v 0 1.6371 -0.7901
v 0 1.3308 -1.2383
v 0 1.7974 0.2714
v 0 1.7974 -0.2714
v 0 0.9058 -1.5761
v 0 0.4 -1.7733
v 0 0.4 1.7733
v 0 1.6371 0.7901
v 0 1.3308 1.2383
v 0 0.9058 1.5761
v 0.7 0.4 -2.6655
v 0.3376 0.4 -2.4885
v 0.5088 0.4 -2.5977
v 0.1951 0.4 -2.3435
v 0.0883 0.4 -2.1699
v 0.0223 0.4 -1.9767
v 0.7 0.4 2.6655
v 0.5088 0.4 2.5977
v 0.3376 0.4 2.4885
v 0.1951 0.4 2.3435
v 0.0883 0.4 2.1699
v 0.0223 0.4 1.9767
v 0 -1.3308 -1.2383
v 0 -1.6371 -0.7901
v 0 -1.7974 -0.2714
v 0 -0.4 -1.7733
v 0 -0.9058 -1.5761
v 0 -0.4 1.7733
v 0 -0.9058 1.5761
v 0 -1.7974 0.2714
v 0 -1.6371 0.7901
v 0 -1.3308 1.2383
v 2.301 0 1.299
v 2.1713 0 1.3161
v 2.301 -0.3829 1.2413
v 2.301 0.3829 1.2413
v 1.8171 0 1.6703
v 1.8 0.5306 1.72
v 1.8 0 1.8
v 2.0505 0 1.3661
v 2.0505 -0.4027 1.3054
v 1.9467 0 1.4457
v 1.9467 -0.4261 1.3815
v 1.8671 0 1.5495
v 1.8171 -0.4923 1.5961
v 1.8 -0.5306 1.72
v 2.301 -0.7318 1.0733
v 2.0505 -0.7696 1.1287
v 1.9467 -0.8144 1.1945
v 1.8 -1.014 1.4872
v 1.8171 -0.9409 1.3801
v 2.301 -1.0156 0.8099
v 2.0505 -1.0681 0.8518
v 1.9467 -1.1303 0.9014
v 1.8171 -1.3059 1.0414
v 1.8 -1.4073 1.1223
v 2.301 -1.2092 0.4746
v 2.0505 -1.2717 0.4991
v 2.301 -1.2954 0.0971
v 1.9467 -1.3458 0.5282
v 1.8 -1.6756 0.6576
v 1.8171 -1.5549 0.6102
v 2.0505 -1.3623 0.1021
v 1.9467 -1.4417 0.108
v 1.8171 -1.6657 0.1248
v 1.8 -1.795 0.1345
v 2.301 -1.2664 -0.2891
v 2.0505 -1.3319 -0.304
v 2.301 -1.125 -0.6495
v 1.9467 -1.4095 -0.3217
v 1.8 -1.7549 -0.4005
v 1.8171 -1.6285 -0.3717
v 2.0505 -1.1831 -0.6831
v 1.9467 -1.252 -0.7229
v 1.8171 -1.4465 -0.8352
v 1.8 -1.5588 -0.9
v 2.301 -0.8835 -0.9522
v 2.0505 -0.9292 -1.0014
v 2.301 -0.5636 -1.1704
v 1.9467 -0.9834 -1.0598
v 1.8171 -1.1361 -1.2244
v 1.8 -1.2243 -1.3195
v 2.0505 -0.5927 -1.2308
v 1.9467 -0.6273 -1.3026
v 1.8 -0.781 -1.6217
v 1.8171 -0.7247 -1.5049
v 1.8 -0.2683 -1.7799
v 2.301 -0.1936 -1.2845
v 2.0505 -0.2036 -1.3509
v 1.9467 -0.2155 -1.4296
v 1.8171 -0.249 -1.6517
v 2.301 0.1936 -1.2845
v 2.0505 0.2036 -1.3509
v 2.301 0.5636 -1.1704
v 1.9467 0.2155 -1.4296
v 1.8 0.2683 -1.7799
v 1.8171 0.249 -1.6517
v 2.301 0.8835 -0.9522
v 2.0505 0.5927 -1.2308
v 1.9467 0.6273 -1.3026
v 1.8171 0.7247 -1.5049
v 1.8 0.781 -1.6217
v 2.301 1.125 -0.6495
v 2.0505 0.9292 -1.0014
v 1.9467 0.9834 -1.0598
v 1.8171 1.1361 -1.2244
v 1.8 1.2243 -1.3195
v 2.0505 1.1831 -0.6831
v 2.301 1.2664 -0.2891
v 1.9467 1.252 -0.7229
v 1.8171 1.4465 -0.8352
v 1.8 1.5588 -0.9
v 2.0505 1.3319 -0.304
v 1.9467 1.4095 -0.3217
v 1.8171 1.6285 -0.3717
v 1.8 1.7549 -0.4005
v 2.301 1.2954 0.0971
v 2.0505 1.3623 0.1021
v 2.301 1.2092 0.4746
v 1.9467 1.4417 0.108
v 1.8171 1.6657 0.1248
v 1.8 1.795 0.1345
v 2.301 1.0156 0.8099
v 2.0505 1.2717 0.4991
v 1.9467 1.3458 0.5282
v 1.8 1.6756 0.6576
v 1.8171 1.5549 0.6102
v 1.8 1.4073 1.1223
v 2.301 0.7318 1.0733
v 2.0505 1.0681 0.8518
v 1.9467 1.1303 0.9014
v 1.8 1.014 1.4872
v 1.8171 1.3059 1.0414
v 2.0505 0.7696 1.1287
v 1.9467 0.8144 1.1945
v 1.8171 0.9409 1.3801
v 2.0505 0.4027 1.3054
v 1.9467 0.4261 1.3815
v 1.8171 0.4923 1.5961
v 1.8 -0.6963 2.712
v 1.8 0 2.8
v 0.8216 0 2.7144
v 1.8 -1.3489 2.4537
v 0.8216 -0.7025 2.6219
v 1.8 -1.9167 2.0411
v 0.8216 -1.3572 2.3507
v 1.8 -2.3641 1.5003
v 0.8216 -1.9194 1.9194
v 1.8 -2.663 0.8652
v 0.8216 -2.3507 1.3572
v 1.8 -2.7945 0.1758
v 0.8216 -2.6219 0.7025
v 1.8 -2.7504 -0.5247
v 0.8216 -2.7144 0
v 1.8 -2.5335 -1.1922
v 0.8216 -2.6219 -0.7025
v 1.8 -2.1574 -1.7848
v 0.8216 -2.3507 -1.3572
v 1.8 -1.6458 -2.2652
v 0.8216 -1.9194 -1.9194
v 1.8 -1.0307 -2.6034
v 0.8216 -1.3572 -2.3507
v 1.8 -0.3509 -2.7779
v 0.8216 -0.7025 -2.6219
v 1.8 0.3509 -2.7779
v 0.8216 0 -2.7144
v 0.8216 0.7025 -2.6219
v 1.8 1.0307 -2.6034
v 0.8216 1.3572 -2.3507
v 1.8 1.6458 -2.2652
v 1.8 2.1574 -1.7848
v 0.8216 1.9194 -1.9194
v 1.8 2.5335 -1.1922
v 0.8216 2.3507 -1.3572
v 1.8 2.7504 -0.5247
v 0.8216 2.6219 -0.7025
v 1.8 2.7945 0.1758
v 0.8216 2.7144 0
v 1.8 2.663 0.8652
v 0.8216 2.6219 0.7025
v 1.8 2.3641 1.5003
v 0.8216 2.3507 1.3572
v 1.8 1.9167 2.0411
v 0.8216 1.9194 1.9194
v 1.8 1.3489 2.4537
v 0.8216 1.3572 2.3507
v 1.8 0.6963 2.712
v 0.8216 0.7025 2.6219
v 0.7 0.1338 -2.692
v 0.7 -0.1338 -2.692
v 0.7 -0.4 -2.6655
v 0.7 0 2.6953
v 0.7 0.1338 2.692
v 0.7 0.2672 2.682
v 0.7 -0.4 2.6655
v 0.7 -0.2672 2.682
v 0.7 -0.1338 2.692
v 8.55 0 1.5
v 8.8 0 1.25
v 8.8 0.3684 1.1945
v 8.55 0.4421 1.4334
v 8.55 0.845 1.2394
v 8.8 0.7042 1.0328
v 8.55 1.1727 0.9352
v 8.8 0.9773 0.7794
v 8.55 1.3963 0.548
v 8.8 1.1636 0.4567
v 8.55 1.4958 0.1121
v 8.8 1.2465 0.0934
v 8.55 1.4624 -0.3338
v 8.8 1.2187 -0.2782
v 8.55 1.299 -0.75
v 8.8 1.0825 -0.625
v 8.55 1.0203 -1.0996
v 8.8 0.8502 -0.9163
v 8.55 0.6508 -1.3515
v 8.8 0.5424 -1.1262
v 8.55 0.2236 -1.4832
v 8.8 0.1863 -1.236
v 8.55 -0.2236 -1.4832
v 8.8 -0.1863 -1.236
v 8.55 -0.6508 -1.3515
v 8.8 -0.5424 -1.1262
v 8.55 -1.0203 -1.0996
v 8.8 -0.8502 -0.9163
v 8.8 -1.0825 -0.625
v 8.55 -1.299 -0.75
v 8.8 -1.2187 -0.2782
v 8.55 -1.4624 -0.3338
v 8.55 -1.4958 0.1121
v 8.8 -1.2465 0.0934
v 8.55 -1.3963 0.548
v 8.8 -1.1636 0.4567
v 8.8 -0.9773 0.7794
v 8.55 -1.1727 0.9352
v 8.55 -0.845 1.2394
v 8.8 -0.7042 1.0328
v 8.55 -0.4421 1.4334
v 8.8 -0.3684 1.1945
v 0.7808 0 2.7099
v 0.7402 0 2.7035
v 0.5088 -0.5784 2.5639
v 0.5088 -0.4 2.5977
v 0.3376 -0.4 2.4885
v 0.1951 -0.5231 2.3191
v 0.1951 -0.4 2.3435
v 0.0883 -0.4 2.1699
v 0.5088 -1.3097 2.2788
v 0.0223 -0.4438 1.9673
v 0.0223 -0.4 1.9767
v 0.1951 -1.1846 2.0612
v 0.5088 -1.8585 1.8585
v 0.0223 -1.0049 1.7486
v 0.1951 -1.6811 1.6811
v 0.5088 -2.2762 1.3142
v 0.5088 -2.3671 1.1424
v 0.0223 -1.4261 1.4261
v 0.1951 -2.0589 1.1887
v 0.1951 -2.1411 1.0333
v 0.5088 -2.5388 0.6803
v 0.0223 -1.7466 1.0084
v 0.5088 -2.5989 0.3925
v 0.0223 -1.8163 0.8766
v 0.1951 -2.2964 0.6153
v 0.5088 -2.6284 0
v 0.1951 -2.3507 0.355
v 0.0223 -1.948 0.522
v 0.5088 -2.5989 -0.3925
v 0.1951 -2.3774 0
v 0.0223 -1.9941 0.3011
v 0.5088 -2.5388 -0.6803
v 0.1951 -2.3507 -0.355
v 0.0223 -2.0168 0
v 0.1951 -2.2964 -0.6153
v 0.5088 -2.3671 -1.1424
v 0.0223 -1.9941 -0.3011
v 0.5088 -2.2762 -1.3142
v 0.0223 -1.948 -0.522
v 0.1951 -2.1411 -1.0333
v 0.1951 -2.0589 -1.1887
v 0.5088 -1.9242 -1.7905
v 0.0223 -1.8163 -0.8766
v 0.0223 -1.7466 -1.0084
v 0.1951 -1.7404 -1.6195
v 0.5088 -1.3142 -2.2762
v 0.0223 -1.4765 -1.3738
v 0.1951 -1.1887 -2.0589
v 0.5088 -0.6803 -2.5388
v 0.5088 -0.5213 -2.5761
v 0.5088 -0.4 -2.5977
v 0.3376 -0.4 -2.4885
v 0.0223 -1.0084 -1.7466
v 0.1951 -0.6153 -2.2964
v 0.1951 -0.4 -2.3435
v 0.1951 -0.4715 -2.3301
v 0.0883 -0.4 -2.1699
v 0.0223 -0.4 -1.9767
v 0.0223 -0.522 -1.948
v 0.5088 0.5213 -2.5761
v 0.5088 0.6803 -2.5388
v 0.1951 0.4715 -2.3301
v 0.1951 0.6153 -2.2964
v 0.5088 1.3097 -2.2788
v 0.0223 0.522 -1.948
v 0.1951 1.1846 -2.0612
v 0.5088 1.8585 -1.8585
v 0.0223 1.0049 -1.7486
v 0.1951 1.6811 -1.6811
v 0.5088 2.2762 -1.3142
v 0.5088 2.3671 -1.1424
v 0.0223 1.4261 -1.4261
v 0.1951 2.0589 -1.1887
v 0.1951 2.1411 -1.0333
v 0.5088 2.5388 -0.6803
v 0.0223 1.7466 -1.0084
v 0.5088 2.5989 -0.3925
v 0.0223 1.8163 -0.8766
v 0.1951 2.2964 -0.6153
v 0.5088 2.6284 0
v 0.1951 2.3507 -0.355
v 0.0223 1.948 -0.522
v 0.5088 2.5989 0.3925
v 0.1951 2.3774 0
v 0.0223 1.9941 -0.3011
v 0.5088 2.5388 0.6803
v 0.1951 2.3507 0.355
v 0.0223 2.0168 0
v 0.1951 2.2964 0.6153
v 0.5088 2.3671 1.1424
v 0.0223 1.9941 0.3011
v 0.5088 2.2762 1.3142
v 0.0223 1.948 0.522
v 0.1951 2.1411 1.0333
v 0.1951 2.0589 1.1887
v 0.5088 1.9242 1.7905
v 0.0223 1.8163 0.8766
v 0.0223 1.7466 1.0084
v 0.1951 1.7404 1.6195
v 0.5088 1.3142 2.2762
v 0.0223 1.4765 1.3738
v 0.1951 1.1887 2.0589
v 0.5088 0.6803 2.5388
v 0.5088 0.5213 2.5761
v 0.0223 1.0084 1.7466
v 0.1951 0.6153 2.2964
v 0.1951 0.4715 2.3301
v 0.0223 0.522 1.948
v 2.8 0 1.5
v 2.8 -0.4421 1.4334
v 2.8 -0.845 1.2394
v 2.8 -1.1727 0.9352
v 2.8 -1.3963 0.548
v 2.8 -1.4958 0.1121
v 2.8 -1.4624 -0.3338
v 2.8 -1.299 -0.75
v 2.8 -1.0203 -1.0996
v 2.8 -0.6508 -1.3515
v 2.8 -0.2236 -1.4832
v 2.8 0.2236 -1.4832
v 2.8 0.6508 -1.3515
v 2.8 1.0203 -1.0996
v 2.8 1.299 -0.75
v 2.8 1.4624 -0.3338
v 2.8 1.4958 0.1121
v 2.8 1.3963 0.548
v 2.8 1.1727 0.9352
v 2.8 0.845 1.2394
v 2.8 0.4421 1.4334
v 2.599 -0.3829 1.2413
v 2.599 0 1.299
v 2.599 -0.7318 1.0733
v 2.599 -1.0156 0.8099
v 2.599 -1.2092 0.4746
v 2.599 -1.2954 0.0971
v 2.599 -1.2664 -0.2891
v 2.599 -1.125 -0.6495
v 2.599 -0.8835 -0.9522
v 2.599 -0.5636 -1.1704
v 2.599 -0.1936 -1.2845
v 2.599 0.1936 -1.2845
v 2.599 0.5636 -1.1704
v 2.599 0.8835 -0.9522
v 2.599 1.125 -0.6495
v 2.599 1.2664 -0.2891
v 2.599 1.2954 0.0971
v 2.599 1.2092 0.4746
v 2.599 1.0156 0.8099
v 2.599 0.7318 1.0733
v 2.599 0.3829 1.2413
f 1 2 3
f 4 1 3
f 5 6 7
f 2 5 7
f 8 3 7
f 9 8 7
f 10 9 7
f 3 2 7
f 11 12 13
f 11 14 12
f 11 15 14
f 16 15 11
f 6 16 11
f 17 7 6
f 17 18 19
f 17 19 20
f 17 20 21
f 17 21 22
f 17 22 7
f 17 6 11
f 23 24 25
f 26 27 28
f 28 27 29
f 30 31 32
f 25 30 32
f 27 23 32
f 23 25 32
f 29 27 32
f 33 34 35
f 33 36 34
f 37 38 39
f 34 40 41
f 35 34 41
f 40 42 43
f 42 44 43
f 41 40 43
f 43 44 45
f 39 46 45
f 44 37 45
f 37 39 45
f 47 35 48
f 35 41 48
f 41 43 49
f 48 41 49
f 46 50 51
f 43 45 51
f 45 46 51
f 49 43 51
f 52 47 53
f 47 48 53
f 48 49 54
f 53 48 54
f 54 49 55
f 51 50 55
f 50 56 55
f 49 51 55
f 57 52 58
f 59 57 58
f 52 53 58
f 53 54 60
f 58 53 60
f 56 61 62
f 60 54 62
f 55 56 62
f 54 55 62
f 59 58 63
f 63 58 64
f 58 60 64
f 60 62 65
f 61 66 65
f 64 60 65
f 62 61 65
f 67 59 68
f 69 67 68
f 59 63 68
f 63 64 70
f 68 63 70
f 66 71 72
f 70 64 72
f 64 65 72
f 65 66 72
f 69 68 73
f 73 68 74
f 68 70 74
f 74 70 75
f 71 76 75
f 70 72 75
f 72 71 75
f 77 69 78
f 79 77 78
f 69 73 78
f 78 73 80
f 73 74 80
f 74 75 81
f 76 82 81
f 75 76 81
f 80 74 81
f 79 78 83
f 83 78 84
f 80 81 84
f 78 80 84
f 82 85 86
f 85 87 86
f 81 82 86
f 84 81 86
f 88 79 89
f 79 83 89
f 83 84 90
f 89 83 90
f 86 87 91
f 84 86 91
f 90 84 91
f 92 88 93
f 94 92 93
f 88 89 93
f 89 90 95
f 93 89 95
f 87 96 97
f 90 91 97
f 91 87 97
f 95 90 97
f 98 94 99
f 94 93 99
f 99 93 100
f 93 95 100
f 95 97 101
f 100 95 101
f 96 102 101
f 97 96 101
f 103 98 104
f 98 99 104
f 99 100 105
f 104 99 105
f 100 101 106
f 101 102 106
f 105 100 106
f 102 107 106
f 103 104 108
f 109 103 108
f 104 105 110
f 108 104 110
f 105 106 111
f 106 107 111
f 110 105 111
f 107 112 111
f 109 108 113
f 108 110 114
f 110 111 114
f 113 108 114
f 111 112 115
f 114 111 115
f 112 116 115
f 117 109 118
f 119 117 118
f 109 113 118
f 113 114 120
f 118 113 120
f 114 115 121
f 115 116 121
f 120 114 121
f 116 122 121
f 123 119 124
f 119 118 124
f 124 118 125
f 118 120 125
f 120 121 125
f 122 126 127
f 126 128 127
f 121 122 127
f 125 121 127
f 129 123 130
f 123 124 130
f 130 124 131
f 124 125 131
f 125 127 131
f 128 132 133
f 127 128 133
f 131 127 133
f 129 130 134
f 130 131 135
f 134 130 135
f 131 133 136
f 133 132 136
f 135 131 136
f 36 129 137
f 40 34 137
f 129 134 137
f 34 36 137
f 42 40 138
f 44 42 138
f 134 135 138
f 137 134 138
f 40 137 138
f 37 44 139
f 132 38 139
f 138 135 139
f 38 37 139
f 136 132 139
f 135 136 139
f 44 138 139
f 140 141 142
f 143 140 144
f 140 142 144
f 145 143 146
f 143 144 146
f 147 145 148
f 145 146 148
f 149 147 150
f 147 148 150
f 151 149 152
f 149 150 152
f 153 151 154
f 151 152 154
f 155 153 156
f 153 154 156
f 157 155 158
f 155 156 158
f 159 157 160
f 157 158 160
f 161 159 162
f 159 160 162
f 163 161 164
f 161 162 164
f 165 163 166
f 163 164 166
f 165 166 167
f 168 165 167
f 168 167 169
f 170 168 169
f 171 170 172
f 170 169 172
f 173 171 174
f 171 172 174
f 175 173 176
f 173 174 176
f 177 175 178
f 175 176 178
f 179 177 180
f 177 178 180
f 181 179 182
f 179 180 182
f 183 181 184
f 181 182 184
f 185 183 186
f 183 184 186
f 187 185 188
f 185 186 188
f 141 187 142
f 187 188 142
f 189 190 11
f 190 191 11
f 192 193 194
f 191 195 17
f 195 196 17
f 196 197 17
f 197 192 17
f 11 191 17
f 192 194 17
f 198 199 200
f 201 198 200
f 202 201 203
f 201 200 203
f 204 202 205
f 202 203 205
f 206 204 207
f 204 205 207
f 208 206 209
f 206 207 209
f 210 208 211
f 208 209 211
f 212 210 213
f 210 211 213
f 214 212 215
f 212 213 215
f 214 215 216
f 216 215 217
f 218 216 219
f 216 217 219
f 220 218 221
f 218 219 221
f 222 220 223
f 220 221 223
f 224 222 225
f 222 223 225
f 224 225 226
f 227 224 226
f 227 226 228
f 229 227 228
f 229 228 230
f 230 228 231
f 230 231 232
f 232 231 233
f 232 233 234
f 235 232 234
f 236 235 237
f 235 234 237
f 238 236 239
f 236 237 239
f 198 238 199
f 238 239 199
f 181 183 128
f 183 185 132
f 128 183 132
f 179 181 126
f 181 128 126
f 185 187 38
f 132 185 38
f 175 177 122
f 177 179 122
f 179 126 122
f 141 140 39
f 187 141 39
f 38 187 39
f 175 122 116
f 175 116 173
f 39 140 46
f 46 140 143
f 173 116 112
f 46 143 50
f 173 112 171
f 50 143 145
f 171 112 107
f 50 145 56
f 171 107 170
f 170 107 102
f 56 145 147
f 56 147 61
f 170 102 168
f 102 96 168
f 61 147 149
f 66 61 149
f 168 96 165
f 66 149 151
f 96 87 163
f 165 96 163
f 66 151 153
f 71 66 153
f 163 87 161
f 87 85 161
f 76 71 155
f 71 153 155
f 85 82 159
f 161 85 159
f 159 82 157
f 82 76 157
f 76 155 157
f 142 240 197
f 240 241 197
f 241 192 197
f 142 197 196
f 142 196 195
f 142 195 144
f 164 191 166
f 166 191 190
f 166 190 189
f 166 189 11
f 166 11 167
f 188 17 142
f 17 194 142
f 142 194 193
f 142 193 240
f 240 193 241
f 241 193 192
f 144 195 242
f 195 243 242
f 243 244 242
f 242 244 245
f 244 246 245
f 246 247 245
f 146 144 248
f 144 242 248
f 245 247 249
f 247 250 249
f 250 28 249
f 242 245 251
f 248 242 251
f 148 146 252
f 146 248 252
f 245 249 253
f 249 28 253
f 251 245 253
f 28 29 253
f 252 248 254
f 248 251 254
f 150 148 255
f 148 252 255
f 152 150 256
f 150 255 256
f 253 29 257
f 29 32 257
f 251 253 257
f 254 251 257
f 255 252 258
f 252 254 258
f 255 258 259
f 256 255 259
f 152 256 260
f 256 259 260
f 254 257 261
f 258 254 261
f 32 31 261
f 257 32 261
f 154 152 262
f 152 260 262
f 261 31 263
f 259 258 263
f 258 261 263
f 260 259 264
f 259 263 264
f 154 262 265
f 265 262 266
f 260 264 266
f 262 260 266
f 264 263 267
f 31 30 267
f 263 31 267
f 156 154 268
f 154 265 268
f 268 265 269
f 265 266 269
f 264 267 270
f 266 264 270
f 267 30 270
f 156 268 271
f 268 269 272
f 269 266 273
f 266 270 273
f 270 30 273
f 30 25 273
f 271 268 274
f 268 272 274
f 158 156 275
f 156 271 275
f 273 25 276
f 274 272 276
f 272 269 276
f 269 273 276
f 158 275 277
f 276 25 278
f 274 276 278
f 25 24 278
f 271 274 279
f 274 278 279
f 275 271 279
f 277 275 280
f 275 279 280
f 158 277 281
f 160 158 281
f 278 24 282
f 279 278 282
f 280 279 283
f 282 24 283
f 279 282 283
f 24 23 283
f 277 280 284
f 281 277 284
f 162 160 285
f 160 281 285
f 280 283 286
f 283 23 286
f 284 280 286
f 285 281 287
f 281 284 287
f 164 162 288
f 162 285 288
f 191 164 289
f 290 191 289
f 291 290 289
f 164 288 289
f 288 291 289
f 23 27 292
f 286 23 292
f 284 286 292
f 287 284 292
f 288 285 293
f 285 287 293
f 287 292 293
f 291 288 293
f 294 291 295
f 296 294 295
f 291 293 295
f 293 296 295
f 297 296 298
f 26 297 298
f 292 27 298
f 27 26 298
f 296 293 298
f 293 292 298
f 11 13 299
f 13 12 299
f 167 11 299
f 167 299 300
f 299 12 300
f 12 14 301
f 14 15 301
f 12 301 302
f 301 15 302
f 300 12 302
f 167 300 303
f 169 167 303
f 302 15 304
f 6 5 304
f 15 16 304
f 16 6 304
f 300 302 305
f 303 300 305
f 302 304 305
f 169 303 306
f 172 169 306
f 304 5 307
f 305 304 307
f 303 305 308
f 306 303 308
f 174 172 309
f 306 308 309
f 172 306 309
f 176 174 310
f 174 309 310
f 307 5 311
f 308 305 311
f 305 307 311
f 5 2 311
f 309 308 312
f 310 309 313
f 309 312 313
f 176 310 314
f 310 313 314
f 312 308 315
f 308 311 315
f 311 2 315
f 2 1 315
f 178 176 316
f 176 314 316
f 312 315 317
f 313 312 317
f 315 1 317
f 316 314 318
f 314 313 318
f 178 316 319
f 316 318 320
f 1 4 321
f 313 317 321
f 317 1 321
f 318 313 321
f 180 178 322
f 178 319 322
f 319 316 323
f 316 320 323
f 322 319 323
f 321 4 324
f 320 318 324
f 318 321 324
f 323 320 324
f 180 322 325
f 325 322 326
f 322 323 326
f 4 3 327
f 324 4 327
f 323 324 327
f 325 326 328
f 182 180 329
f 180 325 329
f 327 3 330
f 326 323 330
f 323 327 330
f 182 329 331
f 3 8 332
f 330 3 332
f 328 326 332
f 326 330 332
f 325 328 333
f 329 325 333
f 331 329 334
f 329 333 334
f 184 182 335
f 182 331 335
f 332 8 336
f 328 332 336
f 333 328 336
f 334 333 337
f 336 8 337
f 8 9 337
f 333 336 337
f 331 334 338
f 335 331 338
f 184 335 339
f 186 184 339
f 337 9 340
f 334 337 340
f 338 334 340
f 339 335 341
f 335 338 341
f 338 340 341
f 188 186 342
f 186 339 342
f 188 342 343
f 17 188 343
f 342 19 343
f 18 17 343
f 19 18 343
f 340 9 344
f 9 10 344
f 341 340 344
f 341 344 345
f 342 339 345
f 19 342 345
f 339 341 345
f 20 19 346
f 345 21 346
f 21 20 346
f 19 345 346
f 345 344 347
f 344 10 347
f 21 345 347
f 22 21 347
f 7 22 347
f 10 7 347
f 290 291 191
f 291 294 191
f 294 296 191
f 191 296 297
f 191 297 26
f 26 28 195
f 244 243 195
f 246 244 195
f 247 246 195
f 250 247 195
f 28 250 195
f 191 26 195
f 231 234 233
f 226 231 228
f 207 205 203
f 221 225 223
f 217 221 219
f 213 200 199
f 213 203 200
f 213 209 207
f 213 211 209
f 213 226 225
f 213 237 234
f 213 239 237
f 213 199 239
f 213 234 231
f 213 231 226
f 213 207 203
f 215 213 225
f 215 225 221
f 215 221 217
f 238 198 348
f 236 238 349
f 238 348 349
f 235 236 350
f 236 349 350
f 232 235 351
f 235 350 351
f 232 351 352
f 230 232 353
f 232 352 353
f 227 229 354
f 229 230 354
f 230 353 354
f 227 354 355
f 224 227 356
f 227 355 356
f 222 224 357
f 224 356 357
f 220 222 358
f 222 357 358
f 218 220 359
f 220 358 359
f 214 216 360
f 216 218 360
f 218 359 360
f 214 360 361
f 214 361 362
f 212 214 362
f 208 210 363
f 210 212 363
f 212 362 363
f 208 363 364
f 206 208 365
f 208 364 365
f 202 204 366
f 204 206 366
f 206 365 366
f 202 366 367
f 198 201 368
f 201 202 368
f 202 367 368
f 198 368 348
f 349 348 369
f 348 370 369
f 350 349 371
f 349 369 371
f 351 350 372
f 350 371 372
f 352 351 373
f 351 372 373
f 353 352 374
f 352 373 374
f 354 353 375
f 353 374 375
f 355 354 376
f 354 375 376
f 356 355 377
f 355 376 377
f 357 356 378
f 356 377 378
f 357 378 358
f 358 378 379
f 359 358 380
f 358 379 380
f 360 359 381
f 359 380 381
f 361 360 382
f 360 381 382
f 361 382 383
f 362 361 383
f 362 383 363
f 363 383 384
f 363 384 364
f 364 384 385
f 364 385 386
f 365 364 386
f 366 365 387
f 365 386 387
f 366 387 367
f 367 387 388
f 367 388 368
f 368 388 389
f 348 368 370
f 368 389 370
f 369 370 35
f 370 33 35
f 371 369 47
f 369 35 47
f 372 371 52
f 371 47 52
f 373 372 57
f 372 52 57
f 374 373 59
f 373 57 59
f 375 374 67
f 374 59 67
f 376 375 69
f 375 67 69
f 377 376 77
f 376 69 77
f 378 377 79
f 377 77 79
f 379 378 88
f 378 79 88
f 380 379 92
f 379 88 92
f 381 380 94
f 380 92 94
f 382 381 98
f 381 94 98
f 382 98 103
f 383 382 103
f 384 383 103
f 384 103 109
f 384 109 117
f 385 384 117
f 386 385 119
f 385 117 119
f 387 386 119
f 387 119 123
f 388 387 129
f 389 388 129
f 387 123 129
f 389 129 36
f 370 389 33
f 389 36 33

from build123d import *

# Parameters (mm, degrees)
SKETCH_4_W          = 0.7
SKETCH_4_H          = 0.8
CUT_EXTRUDE_1_DEPTH = 50
SKETCH_6_R          = 4.963910668
CUT_EXTRUDE_2_DEPTH = 5
CHAMFER_1_SIZE      = 0.25


with BuildPart() as part:
    # 草图3 → Revolve 929 (revolve)
    with BuildSketch(Plane.XY, mode=Mode.PRIVATE) as revolve_929_sk:
        with BuildLine():
            Line((0, 0), (13.8, 0))
            Line((13.8, 0), (13.8, 1.5))
            Line((13.8, 1.5), (2.8, 1.5))
            Line((2.8, 1.5), (2.599, 1.299))
            Line((2.599, 1.299), (2.301, 1.299))
            ThreePointArc((2.301, 1.299), (1.946739503, 1.445739503), (1.8, 1.8))
            Line((1.8, 1.8), (1.8, 2.8))
            Line((1.8, 2.8), (0.821559832, 2.714397577))
            ThreePointArc((0.821559832, 2.714397577), (0.236450397, 2.425853536), (0, 1.817822349))
            Line((0, 1.817822349), (0, 0))
        make_face()
    revolve(revolve_929_sk.sketch.rotate(Axis((-2.477021524, 0, 0), (1, 0, 0)), 90), axis=Axis((-2.477021524, 0, 0), (1, 0, 0)))

    # 草图4 → 切除-拉伸1 (cut, symmetric)
    with BuildSketch(Plane.XY):
        with Locations((0.35, 0)):
            Rectangle(SKETCH_4_W, SKETCH_4_H)
    extrude(amount=CUT_EXTRUDE_1_DEPTH, both=True, mode=Mode.SUBTRACT)

    # 草图5 → 切除-旋转1 (revolve, cut)
    with BuildSketch(Plane.XY, mode=Mode.PRIVATE) as cut_revolve_1_sk:
        Polygon((13.547291997, 1.5), (14.047291997, 1.5), (13.8, 1.067), align=None)
    revolve(cut_revolve_1_sk.sketch.rotate(Axis((6.174994867, 0, 0), (-1, 0, 0)), 270), axis=Axis((6.174994867, 0, 0), (-1, 0, 0)), mode=Mode.SUBTRACT)

    # 草图6 → 切除-拉伸2 (cut)
    with BuildSketch(Plane(origin=(13.8, 0, 0), x_dir=(0, 0, -1), z_dir=(1, 0, 0))):
        Circle(SKETCH_6_R)
    extrude(amount=-CUT_EXTRUDE_2_DEPTH, mode=Mode.SUBTRACT)

    # 倒角1
    chamfer_1_edges = [part.edges().sort_by_distance(p)[0] for p in [
        (8.8, 0, -1.5),
    ]]
    chamfer(chamfer_1_edges, length=CHAMFER_1_SIZE)


solid = part.part
